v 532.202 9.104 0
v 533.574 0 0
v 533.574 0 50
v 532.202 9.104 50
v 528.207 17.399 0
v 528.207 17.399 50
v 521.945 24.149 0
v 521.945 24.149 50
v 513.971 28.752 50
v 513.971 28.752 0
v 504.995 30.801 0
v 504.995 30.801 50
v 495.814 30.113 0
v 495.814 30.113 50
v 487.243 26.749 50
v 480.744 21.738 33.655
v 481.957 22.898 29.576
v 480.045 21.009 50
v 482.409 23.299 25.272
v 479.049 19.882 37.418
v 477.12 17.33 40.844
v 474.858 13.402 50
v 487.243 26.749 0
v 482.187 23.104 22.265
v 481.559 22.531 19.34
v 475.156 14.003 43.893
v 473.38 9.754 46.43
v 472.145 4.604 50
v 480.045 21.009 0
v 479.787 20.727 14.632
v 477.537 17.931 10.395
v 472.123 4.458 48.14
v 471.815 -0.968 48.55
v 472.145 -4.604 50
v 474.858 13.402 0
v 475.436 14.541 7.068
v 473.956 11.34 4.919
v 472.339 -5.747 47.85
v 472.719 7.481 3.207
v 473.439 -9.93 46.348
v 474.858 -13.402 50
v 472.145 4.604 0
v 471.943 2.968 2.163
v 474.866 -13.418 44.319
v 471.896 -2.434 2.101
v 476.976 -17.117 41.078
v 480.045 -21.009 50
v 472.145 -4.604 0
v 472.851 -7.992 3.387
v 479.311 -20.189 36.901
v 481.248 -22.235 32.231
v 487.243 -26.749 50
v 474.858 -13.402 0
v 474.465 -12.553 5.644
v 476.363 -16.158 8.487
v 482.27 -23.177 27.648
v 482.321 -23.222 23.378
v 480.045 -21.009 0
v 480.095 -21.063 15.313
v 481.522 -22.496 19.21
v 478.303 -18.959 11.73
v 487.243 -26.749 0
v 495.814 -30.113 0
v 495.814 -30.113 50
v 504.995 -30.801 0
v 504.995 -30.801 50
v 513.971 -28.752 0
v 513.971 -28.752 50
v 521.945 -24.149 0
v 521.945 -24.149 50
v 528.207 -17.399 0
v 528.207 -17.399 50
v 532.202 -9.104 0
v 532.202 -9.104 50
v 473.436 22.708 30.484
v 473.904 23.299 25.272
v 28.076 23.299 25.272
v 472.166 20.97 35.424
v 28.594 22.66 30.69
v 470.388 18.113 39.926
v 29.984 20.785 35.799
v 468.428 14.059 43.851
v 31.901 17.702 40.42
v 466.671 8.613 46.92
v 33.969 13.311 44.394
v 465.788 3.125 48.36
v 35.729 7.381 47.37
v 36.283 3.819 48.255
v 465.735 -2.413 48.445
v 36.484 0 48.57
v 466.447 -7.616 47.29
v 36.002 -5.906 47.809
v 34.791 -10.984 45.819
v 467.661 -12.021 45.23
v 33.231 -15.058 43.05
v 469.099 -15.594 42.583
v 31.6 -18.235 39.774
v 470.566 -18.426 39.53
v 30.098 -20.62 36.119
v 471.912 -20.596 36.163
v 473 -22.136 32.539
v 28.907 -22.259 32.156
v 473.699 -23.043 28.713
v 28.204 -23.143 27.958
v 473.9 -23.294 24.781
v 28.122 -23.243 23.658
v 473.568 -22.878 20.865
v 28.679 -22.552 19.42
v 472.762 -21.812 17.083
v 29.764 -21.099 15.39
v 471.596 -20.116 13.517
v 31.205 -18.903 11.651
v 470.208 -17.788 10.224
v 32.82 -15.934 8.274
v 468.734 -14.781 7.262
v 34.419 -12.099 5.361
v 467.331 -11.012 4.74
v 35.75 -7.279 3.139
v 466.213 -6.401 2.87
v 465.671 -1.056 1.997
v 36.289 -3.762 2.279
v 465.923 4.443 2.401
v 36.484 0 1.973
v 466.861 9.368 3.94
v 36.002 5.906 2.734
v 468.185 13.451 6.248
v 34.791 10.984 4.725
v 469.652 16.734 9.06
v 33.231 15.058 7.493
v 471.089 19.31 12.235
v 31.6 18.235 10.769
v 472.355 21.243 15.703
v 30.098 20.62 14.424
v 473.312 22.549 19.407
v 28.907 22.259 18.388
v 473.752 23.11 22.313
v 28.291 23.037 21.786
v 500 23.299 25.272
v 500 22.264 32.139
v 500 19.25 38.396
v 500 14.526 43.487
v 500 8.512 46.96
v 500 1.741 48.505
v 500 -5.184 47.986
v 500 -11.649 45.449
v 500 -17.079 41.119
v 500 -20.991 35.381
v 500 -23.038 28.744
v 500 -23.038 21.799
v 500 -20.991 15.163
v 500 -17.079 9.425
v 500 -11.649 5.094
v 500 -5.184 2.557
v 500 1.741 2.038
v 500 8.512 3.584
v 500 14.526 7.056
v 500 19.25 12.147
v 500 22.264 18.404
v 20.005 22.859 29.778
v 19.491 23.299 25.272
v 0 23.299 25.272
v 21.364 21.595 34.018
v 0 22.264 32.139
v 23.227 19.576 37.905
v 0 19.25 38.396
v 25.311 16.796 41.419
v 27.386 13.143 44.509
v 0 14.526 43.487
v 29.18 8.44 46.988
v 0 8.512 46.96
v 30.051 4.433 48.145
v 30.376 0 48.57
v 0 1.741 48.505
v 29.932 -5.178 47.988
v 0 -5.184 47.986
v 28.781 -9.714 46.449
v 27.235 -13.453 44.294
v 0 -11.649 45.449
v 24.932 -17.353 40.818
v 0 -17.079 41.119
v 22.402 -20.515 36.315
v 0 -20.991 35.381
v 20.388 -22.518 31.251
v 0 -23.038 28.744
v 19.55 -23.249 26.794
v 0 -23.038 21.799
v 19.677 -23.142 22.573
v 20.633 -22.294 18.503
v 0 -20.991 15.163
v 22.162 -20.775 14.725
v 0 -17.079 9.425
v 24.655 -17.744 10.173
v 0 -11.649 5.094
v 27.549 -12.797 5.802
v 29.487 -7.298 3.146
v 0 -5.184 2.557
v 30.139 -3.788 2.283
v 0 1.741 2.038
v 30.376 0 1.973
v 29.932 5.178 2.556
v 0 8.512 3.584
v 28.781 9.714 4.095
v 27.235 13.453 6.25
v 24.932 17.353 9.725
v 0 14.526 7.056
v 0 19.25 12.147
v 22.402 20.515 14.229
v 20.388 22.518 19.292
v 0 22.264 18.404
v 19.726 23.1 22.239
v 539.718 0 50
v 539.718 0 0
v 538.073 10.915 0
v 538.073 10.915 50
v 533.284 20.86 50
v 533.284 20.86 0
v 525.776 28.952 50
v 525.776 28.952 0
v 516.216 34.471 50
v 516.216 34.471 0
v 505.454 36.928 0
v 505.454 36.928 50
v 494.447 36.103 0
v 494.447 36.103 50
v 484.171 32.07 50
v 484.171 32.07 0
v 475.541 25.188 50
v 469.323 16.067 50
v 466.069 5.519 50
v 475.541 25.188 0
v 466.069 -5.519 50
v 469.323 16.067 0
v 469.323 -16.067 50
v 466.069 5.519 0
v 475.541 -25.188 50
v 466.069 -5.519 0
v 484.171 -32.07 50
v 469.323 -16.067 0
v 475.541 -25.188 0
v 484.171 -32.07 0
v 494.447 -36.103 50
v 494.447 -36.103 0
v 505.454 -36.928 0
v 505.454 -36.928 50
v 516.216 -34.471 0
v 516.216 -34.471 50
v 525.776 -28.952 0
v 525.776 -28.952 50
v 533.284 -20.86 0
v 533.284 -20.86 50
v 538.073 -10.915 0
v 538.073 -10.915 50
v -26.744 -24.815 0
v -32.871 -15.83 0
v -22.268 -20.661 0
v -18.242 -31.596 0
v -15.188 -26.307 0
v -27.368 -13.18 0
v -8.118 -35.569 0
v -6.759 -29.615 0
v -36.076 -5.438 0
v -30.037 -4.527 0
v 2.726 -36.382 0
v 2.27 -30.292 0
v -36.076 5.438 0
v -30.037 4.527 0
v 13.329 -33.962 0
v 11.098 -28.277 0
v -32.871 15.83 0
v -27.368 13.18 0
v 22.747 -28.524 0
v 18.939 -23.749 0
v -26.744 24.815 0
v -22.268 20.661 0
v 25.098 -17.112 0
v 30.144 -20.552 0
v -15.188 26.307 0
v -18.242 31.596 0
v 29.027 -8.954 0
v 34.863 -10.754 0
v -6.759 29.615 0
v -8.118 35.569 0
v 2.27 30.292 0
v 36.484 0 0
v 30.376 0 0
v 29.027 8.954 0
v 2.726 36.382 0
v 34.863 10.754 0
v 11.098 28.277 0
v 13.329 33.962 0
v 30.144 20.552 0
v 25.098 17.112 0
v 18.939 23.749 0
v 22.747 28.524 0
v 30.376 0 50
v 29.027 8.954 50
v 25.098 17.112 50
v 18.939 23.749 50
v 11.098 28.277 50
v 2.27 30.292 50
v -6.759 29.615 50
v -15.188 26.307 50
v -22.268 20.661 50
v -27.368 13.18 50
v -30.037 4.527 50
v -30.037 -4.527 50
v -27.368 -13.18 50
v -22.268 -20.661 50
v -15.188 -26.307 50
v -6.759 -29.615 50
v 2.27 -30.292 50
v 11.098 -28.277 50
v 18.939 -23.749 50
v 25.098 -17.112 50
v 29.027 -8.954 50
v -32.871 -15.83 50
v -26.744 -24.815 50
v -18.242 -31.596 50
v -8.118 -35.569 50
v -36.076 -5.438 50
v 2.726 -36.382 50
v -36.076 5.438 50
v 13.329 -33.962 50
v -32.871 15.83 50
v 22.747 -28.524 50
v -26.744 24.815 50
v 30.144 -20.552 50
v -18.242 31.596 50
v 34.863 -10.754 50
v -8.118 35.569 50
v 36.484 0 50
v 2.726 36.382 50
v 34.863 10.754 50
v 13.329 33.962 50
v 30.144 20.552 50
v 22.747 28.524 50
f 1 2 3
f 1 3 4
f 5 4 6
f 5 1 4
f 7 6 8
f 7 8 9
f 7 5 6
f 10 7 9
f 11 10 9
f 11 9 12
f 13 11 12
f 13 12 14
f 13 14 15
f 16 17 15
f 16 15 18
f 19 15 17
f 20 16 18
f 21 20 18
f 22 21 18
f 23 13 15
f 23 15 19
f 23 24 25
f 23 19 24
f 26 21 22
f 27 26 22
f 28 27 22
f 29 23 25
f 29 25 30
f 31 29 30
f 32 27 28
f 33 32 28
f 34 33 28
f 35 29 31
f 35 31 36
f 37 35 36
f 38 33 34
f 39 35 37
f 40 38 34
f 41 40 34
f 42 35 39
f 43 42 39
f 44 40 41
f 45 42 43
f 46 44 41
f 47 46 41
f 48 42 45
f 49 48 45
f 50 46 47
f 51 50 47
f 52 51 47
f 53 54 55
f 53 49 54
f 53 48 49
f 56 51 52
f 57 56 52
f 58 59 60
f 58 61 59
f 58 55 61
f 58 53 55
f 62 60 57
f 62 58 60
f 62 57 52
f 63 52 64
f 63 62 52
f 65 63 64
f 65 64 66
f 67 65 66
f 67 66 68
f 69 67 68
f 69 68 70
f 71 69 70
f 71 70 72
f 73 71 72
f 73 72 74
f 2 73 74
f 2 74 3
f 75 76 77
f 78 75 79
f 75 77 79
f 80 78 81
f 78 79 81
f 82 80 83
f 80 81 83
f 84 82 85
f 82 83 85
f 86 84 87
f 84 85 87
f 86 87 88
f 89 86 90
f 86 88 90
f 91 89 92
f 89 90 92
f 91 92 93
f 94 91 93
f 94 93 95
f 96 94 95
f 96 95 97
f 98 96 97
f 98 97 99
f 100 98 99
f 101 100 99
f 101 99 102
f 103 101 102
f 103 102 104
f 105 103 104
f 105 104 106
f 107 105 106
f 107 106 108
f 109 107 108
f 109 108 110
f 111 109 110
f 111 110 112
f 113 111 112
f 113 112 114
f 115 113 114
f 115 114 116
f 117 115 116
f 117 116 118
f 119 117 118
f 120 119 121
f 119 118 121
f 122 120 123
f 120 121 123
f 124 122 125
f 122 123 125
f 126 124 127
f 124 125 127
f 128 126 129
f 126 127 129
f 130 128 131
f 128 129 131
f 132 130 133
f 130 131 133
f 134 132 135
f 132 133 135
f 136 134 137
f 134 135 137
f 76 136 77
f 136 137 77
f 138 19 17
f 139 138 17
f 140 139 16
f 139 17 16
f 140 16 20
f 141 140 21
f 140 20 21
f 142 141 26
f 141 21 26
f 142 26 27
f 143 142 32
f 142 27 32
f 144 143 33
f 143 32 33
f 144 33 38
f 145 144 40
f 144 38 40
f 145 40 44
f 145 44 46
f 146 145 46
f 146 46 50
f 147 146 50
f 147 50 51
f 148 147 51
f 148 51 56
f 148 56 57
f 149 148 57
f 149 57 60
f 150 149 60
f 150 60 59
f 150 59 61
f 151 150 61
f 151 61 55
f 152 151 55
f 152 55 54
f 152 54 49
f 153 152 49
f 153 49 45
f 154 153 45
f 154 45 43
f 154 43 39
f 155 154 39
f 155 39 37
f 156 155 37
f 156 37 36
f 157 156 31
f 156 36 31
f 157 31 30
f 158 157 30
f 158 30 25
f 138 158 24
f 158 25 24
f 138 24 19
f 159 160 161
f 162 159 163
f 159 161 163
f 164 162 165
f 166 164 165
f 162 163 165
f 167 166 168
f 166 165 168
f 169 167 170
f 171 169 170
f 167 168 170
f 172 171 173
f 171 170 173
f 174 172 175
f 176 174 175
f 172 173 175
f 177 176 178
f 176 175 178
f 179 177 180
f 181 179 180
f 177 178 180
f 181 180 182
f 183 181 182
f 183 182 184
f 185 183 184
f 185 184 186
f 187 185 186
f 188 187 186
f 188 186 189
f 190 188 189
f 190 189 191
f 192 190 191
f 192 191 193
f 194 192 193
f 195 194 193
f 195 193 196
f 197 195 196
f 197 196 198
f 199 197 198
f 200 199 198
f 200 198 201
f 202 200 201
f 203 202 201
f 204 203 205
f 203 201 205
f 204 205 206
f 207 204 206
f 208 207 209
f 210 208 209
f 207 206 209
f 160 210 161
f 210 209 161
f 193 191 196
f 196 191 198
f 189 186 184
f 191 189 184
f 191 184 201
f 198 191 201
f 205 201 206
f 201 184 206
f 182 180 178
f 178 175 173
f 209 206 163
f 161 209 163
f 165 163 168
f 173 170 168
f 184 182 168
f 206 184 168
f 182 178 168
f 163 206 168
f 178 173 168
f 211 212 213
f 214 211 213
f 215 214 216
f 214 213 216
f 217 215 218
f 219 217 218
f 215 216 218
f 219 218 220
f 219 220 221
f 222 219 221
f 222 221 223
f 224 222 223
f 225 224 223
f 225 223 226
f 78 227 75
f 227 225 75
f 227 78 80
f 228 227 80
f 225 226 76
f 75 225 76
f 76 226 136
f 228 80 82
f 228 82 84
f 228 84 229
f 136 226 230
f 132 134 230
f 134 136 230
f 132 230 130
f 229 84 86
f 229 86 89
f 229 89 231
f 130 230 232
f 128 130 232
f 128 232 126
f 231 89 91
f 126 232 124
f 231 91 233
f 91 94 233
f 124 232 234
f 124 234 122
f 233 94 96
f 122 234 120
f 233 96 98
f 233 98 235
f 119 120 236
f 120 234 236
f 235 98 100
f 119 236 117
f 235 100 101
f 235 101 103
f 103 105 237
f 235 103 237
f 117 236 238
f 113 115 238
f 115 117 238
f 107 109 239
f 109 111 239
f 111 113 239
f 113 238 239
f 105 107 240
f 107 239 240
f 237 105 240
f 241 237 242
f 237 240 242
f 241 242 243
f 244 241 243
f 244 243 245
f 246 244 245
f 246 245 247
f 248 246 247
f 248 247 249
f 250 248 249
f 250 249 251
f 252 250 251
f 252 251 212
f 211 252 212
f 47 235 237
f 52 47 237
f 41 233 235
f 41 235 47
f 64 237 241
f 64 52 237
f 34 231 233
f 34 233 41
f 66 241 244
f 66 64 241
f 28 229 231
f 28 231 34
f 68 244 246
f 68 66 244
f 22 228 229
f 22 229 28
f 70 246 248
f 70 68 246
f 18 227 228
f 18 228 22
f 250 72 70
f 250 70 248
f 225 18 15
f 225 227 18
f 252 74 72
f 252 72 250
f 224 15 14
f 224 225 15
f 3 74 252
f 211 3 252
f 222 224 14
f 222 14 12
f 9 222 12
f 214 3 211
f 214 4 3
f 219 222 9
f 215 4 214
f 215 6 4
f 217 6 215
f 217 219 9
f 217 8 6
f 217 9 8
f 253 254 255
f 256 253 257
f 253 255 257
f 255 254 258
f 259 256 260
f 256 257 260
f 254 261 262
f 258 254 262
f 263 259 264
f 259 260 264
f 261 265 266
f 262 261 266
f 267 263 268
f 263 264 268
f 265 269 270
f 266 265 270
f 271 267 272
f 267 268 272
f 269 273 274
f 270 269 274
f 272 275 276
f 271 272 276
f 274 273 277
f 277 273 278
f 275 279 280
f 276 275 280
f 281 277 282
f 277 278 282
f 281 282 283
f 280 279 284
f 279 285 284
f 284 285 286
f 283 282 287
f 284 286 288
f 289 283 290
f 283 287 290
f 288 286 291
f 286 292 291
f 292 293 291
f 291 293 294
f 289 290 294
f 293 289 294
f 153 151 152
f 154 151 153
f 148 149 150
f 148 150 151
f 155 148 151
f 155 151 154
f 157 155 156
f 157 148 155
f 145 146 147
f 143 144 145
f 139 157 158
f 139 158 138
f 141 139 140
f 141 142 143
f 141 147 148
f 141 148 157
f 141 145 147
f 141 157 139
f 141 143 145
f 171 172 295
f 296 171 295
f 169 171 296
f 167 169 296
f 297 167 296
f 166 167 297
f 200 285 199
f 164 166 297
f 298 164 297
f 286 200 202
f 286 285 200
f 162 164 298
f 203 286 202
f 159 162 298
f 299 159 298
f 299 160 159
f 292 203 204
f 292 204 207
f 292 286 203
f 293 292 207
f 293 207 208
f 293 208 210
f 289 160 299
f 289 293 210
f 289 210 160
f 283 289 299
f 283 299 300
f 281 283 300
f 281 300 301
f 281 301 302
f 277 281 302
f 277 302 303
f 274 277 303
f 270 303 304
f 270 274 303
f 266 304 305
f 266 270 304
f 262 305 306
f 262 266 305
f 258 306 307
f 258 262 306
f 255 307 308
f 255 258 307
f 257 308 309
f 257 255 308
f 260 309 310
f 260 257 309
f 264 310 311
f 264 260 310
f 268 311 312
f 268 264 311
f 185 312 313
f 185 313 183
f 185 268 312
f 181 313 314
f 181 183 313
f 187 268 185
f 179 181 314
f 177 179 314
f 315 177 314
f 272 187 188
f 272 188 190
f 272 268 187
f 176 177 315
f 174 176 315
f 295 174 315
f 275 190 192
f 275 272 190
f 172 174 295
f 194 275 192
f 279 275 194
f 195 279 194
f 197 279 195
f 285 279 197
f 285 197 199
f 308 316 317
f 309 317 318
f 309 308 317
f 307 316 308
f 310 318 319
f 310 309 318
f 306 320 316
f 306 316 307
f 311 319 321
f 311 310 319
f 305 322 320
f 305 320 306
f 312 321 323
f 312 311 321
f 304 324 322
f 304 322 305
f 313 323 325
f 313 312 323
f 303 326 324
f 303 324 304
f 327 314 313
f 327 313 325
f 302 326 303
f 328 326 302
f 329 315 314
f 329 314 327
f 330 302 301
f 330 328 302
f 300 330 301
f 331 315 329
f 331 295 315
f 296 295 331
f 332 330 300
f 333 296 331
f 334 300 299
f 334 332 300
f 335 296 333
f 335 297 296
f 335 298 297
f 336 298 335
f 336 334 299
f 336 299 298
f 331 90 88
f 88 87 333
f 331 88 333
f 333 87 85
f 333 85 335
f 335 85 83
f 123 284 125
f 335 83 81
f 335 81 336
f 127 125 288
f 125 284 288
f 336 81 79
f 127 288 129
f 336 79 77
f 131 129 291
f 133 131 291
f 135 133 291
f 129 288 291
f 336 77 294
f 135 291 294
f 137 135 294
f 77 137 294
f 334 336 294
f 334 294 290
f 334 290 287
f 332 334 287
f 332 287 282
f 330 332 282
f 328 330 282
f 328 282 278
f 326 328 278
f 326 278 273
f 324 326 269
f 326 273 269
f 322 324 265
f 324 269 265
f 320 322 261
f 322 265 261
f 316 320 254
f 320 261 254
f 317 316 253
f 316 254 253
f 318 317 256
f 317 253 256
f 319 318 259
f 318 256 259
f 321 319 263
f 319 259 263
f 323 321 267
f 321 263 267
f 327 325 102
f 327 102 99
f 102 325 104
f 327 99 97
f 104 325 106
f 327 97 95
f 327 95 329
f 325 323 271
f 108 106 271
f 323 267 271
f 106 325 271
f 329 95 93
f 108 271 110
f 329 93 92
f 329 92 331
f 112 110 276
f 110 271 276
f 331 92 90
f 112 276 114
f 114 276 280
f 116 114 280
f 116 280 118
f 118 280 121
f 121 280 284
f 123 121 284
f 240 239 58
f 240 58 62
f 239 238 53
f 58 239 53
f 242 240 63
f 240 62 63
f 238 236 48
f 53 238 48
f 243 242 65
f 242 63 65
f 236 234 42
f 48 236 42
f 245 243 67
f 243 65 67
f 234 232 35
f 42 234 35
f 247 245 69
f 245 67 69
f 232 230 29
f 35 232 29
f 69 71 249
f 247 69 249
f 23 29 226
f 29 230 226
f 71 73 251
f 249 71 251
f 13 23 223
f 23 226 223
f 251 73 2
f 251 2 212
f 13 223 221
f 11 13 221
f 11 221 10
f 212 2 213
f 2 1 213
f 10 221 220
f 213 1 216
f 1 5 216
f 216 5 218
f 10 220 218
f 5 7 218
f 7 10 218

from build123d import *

# Parameters (mm, degrees)
F0_R     = 36.483751
F0_R_2   = 30.376476
F1_DEPTH = 50
F2_R     = 23.298681
F3_DEPTH = 500
F4_R     = 37.031172
F4_R_2   = 30.887405
F5_DEPTH = 50


with BuildPart() as f1:
    # F0 (on Top) → F1 (new body)
    with BuildSketch(Plane.XY):
        Circle(F0_R)
        Circle(F0_R_2, mode=Mode.SUBTRACT)
    extrude(amount=F1_DEPTH)

    # F2 (on Right) → F3 (join)
    with BuildSketch(Plane.YZ):
        with Locations((0, 25.27174)):
            Circle(F2_R)
    extrude(amount=F3_DEPTH)

    # F4 (on Top) → F5 (join)
    with BuildSketch(Plane.XY):
        with Locations((502.687037, 0)):
            Circle(F4_R)
        with Locations((502.687037, 0)):
            Circle(F4_R_2, mode=Mode.SUBTRACT)
    extrude(amount=F5_DEPTH)


solid = f1.part
